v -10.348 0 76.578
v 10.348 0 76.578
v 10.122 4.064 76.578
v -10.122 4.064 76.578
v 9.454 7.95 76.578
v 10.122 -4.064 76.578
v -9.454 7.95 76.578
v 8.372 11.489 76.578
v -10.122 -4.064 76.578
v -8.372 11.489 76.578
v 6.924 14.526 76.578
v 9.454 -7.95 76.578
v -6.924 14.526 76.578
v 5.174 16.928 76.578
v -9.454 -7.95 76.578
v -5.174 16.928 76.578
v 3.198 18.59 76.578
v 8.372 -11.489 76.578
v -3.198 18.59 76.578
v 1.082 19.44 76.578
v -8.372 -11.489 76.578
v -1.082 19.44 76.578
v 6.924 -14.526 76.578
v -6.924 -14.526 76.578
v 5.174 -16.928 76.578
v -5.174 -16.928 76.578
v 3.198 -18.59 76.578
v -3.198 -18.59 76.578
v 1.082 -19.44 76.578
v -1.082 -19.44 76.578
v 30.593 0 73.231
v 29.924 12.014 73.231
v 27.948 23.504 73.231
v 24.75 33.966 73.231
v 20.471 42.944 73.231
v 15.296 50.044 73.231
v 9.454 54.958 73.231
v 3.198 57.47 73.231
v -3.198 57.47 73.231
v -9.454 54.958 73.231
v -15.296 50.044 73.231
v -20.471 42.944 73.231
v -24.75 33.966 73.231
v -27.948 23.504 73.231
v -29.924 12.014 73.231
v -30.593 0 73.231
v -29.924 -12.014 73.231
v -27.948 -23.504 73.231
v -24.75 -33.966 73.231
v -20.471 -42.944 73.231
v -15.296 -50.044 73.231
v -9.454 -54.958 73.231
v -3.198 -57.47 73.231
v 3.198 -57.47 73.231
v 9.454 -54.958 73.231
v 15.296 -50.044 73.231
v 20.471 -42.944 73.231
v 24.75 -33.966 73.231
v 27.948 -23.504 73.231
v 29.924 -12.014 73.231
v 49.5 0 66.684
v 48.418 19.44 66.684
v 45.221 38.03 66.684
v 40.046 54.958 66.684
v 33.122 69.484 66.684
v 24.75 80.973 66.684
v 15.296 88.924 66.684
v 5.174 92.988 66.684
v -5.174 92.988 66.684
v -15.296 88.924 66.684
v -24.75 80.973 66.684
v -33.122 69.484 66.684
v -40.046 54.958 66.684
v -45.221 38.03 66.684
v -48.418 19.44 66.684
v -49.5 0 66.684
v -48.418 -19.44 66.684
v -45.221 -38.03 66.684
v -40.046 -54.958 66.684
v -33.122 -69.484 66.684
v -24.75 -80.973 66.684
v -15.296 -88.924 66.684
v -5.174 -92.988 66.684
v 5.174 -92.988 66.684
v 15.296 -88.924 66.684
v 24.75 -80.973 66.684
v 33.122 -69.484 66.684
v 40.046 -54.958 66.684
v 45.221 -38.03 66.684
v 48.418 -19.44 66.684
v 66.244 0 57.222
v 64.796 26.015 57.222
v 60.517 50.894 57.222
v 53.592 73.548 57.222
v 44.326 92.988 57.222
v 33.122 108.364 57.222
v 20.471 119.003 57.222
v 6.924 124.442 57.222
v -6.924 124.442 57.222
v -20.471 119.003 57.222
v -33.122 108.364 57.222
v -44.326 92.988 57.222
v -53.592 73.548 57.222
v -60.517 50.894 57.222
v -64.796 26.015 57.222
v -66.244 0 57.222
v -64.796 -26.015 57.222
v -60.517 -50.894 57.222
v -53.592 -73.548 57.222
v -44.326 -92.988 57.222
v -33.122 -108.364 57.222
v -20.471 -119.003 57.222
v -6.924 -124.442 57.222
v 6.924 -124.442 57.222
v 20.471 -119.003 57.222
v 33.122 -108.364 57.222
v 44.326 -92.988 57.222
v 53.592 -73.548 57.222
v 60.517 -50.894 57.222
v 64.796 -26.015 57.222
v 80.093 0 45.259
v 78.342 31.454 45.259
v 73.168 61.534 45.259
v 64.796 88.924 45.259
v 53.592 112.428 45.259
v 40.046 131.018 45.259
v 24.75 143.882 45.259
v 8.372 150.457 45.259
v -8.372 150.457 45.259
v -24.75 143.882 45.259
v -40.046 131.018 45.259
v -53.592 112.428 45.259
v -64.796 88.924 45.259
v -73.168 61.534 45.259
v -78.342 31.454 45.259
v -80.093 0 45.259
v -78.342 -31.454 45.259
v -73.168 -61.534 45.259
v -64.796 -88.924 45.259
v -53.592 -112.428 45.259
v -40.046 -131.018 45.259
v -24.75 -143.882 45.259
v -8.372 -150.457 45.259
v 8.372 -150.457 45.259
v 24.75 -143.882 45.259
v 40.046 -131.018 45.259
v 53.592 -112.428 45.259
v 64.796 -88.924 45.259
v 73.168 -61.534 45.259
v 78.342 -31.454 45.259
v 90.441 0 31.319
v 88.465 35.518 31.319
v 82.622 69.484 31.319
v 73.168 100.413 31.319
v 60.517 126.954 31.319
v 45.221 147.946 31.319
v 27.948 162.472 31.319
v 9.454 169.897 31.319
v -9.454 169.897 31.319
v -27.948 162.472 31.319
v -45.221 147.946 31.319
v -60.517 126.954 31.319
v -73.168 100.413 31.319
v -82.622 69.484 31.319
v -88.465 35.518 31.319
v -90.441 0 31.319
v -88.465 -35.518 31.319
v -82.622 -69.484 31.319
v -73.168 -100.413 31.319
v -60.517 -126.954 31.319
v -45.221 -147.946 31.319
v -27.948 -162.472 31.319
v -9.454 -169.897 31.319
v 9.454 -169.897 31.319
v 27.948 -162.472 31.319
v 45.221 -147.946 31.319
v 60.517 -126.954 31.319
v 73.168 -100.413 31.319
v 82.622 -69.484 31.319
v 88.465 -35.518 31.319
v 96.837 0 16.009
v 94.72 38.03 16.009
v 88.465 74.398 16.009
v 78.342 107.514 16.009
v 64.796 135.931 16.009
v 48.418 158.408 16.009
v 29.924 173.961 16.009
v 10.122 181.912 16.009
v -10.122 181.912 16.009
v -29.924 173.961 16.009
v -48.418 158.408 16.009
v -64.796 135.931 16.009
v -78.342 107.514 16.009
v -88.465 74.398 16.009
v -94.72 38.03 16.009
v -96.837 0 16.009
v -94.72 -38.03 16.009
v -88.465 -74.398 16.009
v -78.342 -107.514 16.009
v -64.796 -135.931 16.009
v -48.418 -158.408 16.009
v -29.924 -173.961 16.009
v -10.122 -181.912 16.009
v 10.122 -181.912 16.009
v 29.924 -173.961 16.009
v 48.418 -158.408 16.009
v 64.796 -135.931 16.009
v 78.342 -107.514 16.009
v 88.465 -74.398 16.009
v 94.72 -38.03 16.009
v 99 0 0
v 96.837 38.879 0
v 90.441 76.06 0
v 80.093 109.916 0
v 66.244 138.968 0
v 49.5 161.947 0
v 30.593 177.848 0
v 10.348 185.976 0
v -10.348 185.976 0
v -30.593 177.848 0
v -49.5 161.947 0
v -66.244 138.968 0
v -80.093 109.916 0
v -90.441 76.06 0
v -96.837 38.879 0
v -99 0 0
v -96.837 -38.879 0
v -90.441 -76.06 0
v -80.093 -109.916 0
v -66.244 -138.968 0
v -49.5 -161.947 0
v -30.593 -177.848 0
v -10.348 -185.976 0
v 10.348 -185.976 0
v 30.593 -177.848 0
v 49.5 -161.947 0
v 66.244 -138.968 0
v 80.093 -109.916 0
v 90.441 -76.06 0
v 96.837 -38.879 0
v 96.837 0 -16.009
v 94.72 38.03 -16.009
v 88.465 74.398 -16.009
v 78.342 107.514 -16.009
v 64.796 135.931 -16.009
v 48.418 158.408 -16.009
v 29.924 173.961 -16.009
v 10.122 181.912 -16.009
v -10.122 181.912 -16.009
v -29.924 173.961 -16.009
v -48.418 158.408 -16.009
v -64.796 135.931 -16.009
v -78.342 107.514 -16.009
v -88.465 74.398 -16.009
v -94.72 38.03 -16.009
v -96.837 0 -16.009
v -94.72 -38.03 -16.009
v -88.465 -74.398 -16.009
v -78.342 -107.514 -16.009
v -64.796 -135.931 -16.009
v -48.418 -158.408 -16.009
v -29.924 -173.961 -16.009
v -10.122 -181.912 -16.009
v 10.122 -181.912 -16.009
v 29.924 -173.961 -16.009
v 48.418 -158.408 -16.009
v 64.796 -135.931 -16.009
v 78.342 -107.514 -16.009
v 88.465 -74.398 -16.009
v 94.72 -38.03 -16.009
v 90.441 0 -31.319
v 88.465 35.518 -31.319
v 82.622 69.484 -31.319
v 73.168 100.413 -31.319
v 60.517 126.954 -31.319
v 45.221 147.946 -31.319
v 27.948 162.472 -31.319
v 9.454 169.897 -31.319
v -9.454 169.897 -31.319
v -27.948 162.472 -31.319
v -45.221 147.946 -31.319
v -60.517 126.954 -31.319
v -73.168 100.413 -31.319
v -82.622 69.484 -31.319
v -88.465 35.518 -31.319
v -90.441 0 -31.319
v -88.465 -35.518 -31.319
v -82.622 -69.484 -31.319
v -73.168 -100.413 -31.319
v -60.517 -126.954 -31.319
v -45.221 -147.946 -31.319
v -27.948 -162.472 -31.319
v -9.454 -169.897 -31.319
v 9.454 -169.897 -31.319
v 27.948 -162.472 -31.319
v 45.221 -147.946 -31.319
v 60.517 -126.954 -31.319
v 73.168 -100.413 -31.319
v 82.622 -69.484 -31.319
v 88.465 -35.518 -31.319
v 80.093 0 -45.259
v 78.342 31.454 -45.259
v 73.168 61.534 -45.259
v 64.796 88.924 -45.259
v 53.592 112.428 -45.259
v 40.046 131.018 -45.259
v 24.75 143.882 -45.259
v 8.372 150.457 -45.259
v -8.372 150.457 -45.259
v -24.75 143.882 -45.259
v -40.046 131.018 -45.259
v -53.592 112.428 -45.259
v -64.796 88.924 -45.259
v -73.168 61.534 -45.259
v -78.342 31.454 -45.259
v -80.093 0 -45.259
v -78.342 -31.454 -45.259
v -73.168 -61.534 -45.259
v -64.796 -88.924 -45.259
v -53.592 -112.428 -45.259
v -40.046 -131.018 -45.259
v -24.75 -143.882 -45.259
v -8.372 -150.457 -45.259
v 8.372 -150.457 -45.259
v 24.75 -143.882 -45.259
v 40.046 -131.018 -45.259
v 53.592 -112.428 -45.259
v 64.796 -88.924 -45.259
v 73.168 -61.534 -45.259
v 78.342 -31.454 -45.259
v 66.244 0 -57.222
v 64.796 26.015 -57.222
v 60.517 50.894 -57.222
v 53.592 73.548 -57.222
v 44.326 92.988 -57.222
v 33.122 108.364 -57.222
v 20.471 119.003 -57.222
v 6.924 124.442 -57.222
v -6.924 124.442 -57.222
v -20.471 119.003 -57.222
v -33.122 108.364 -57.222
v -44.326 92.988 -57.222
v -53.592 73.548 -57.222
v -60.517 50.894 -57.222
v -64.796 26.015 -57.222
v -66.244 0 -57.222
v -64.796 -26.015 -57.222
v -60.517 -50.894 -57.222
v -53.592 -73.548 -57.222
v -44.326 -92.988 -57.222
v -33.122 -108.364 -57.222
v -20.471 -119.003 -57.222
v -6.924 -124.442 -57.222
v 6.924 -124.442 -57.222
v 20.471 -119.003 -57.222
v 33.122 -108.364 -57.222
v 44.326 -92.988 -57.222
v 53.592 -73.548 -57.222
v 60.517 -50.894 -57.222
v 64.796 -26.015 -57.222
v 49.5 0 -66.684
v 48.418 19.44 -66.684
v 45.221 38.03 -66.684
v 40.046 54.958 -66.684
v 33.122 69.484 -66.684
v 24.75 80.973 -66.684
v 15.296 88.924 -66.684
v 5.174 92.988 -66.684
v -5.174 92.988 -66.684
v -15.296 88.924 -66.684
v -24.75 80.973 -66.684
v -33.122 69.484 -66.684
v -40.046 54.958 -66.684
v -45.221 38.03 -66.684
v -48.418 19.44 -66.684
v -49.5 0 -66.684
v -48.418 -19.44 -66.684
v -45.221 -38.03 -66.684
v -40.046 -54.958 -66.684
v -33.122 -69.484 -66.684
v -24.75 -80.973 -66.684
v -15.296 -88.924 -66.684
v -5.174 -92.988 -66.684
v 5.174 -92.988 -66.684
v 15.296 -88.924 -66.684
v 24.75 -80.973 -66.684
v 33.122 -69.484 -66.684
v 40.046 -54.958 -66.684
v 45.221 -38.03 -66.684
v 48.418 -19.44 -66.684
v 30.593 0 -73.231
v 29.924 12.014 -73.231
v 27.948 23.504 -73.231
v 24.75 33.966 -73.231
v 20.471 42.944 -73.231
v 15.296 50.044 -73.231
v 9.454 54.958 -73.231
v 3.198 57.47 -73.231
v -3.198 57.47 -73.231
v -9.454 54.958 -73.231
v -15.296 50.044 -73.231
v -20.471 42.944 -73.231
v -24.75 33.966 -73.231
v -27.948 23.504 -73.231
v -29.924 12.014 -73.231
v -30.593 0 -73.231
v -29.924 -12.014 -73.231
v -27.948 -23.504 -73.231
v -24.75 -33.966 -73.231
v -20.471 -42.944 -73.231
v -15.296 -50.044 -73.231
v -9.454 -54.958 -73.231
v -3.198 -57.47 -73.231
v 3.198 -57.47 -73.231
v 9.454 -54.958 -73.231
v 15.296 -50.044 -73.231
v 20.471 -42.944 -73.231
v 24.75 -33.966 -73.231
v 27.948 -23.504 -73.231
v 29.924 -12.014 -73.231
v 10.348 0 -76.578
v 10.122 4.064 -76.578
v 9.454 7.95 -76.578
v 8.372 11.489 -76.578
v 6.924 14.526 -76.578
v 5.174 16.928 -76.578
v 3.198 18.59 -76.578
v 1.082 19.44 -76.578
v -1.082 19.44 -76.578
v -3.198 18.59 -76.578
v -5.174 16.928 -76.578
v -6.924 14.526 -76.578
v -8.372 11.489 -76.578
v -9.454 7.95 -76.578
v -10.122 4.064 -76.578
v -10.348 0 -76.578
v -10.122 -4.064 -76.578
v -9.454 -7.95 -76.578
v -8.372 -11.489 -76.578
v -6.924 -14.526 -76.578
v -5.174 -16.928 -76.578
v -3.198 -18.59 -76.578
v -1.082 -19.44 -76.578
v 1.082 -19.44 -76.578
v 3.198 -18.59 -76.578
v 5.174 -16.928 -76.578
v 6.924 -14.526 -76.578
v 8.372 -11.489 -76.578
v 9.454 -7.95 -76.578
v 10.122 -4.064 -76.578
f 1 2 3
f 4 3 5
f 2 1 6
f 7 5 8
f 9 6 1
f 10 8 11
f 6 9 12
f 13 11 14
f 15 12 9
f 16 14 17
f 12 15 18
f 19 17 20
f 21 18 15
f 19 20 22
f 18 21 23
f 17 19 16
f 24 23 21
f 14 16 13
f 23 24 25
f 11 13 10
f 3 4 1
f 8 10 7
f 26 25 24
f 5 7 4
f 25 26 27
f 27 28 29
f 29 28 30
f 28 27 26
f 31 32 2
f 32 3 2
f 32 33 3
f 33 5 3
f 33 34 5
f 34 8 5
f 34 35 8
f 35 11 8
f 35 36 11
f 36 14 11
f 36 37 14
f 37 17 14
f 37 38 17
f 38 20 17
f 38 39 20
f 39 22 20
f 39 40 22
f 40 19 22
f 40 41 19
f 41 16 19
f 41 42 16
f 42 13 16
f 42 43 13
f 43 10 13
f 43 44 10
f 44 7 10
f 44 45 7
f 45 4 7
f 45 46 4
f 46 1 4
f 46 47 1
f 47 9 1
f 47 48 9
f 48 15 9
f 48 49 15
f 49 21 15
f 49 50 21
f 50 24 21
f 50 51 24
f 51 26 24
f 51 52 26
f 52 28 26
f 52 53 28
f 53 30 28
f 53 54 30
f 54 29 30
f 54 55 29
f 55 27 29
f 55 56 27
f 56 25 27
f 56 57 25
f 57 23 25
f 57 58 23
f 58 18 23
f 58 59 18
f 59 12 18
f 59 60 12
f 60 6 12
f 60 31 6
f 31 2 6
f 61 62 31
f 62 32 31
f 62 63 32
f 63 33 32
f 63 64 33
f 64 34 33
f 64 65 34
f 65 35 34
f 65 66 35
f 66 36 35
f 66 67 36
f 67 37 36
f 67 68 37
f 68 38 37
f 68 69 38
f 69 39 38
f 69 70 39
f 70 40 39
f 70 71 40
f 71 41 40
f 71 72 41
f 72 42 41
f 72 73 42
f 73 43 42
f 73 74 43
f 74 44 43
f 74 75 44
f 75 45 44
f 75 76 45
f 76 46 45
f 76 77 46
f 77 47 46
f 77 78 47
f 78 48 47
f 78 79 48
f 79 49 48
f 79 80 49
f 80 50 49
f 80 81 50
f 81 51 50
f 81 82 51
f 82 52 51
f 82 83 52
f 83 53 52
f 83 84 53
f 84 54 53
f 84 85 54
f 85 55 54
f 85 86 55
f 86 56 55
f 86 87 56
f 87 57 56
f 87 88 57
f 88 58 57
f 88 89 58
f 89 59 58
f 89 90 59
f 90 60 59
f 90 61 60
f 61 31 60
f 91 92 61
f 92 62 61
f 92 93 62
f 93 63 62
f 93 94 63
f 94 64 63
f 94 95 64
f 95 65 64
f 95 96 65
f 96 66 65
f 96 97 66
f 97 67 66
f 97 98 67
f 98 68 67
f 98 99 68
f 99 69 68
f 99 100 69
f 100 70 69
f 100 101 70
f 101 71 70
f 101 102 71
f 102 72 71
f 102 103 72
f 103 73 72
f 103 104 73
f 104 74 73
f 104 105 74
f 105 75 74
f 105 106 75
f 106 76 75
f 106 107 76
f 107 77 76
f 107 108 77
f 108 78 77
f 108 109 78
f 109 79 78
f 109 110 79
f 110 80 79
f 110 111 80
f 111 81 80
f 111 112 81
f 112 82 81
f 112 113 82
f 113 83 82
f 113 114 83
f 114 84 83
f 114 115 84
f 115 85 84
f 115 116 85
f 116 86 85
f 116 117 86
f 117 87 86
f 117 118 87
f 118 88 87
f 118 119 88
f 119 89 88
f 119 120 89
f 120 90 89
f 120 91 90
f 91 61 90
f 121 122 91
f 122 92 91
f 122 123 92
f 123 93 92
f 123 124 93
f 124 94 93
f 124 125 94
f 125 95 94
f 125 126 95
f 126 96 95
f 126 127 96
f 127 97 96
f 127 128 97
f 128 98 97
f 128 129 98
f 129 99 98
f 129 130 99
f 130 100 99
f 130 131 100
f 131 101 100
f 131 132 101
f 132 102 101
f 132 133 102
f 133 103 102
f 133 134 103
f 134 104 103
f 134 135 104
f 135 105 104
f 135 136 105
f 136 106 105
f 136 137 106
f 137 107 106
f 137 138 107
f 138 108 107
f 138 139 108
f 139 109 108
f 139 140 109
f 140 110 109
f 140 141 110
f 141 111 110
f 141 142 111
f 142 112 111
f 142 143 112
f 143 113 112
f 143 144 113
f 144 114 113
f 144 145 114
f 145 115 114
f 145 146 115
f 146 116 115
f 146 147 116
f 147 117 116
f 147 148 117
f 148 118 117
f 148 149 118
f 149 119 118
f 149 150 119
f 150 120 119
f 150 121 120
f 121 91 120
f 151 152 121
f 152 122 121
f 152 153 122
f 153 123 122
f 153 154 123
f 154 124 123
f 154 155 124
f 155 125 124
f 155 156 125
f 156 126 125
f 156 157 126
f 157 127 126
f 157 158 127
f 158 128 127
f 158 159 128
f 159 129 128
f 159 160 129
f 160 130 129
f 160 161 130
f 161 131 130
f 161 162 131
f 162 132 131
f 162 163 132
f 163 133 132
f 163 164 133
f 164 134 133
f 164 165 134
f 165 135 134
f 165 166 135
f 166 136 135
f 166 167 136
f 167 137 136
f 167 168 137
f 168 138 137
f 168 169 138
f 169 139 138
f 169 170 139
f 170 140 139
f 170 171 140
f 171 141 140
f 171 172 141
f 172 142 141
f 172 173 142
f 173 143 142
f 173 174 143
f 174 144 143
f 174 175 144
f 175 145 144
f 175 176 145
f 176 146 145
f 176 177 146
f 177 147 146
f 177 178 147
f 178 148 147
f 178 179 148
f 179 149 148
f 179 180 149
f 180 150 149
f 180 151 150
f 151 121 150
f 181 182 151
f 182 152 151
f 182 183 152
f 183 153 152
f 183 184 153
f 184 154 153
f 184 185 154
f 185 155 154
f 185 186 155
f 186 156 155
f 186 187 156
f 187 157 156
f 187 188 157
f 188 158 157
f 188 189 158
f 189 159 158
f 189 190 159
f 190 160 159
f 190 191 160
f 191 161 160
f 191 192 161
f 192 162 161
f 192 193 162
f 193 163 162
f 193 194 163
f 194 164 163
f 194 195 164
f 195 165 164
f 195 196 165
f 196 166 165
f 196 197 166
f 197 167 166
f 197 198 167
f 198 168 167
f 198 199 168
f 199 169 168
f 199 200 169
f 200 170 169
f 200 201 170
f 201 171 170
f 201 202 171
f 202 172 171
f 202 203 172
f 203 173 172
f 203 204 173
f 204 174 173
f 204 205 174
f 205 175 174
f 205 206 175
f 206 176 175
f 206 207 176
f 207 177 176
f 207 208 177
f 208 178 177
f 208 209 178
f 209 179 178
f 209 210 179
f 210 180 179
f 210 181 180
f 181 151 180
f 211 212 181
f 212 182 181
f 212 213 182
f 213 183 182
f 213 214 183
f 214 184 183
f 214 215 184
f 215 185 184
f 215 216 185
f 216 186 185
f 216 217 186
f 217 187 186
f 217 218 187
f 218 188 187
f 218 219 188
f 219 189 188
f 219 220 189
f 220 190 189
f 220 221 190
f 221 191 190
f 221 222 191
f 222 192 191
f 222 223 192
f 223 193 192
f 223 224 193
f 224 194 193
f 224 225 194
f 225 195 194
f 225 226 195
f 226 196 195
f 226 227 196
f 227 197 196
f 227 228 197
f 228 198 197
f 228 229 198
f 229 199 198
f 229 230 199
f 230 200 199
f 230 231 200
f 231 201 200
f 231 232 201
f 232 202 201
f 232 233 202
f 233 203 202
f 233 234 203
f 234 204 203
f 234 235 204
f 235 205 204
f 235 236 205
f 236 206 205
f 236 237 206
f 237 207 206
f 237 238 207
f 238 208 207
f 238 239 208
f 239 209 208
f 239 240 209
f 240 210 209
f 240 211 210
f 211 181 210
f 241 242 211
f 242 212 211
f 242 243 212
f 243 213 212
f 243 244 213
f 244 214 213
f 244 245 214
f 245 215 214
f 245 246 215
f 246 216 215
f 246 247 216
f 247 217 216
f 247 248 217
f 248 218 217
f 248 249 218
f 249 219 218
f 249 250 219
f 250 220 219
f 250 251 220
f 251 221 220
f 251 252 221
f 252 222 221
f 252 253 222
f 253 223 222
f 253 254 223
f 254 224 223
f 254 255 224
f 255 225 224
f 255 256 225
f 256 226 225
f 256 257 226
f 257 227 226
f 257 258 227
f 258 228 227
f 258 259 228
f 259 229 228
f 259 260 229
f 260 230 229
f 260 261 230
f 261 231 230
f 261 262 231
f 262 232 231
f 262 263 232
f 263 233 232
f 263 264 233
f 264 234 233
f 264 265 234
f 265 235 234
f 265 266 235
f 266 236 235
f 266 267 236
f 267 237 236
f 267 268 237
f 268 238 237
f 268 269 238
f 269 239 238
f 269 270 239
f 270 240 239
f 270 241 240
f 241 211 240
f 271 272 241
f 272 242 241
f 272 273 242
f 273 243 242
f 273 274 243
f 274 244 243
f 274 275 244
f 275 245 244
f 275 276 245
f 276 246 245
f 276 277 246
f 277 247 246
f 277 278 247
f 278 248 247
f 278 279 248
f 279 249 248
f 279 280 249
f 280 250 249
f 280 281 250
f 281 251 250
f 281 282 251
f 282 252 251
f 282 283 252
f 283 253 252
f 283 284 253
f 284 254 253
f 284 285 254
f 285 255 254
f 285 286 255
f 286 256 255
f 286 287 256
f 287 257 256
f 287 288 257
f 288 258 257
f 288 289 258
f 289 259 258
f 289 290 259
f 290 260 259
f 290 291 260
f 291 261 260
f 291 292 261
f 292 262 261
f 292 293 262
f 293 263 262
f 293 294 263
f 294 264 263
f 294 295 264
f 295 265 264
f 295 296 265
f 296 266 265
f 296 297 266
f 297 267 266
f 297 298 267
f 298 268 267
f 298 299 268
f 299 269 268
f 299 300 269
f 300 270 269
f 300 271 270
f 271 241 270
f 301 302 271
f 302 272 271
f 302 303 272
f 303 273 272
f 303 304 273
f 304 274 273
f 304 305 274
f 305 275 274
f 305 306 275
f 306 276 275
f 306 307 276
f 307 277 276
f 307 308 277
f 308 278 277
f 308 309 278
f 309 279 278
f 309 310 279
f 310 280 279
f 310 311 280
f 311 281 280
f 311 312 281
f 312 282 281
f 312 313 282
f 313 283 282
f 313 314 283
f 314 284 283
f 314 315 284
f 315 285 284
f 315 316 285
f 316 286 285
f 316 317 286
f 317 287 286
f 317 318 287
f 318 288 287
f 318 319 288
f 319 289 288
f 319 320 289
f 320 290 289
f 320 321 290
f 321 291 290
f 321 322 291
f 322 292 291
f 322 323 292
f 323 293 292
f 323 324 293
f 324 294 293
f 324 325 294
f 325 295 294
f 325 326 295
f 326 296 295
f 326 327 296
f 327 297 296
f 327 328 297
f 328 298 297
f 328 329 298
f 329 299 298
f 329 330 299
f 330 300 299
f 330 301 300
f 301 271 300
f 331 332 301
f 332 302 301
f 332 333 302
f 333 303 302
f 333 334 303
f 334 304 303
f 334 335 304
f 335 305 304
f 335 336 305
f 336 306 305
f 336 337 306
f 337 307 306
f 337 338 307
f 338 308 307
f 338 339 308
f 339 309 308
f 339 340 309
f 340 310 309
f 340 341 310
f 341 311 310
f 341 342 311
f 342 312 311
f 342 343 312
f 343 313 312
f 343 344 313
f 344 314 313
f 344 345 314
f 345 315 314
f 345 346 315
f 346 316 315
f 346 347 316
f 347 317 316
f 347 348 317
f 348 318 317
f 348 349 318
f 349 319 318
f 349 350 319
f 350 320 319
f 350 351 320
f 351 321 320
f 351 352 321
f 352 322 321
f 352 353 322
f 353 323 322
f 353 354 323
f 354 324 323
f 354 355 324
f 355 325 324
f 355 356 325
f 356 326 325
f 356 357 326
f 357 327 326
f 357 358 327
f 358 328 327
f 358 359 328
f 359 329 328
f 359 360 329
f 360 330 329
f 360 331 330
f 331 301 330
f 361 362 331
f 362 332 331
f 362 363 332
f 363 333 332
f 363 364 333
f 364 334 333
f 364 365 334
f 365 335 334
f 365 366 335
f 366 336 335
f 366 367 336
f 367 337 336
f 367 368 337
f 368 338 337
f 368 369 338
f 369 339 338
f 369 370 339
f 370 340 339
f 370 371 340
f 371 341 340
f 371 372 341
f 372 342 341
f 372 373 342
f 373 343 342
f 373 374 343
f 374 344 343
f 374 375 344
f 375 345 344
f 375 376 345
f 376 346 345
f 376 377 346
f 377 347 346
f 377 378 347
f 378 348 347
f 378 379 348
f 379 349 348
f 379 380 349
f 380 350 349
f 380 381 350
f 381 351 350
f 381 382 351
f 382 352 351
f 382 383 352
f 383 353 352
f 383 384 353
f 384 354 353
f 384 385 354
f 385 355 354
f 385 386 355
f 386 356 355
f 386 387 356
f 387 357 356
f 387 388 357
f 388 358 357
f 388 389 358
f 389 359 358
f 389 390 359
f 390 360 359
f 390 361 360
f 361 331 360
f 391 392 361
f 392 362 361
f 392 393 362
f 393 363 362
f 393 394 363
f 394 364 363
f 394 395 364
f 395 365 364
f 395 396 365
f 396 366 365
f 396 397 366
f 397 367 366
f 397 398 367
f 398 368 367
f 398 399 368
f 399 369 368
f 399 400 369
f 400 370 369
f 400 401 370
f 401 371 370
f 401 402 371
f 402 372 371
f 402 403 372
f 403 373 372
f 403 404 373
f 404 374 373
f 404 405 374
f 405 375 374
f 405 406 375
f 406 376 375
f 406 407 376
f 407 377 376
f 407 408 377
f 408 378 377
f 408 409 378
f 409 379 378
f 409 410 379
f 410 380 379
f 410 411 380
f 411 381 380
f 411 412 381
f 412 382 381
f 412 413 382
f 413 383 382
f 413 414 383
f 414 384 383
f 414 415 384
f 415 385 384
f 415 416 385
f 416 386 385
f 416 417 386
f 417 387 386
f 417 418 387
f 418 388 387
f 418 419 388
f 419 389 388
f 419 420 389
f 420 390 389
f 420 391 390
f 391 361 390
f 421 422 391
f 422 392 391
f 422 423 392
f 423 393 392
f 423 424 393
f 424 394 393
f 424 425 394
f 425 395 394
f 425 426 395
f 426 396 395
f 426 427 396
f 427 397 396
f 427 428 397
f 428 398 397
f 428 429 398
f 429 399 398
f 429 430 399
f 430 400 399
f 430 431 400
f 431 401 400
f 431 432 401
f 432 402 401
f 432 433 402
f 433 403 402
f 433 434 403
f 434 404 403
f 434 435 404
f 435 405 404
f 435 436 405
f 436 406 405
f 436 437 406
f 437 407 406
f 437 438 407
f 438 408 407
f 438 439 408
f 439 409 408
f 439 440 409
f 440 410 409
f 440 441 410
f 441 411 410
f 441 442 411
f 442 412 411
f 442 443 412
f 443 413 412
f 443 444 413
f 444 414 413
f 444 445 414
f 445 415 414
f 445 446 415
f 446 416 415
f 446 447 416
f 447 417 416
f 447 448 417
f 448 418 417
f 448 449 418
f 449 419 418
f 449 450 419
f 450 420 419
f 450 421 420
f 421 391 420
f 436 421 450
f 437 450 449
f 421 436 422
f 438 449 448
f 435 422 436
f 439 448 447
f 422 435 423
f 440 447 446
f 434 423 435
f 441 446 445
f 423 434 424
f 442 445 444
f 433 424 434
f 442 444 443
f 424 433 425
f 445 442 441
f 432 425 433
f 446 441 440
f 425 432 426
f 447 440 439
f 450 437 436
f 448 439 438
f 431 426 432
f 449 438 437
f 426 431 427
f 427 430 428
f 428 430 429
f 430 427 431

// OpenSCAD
// Generated by SolidPython 1.0.1 on 2020-07-29 00:46:49


scale(v = [9, 17, 7]) {
	sphere(r = 11);
}
/***********************************************
*********      SolidPython code:      **********
************************************************
 
# import packages: SolidPython
from solid import *
from solid.utils import *
from itertools import chain, combinations, permutations


class Resize:

    def __init__(self, scad_file):
        self.scad_file = scad_file
        #self.scad_file = import_scad(scad_file)
        # cone/cylinder param:
        self.r1 = 0
        self.r2 = 0
        self.h = 0
        # rectangular prism param:
        self.w = 0
        self.l = 0
        # ellipse param:
        self.r = 0

    # import OpenScad code (file name corresponds to shape)


    # classify shape + parameters
    def assign(self, param1, param2, param3):
        if self.scad_file == 'cone.scad':
            self.r1 = param1
            self.r2 = param2
            self.h = param3
        elif self.scad_file == 'cylinder.scad':
            self.r1 = param1
            self.r2 = param2
            self.h = param3
        elif self.scad_file == 'rectangularPrism.scad':
            self.h = param1
            self.l = param2
            self.w = param3
        else:
            self.r = param1
            self.h = param2

    # resize parameters
    def iterate(self):
        x = range(3, 20, 2)
        i = 1
        if self.scad_file == 'cone.scad':
            tempList = list(permutations(x, 2))
            for temp in tempList:
                param1 = temp[0]
                param2 = temp[1]
                filepath = 'produced_scad_files/' + 'cone' + str(param1) + '_' + str(param2) + '_' + '.scad'
                scad_render_to_file(cylinder(h=param1, r1=param2, r2=0), filepath)

        elif self.scad_file == 'cylinder.scad':
            tempList = list(permutations(x, 3))
            for temp in tempList:
                param1 = temp[0]
                param2 = temp[1]
                filepath = 'produced_scad_files/' + 'cylinder' + str(param1) + '_' + str(param2) + '_' + '.scad'
                scad_render_to_file(cylinder(h=param1, r1=param2, r2=param2), filepath)

        elif self.scad_file == 'rectangularPrism.scad':
            tempList = list(permutations(x, 3))
            for temp in tempList:
                param1 = temp[0]
                param2 = temp[1]
                param3 = temp[2]
                filepath = 'produced_scad_files/' + 'rectangularPrism' + str(param1) + '_' + str(param2) + '_' + str(
                    param3) + '.scad'
                scad_render_to_file(cube(size=(param1, param2, param3)), filepath)

        elif self.scad_file == 'ellipse.scad':
            tempList = list(permutations(x, 4))
            for temp in tempList:
                param1 = temp[0]
                param2 = temp[1]
                param3 = temp[2]
                param4 = temp[3]
                filepath = 'produced_scad_files/' + 'ellipse' + str(param1) + '_' + str(param2) + '_' + str(param3) + '_' + str(param4) + '.scad'
                scad_render_to_file(scale([param1, param2, param3])(sphere(r=param4)), filepath)

    def render_to_scadfile(self):
        scad_render_to_file(scad, 'example.scad') 
 
************************************************/
